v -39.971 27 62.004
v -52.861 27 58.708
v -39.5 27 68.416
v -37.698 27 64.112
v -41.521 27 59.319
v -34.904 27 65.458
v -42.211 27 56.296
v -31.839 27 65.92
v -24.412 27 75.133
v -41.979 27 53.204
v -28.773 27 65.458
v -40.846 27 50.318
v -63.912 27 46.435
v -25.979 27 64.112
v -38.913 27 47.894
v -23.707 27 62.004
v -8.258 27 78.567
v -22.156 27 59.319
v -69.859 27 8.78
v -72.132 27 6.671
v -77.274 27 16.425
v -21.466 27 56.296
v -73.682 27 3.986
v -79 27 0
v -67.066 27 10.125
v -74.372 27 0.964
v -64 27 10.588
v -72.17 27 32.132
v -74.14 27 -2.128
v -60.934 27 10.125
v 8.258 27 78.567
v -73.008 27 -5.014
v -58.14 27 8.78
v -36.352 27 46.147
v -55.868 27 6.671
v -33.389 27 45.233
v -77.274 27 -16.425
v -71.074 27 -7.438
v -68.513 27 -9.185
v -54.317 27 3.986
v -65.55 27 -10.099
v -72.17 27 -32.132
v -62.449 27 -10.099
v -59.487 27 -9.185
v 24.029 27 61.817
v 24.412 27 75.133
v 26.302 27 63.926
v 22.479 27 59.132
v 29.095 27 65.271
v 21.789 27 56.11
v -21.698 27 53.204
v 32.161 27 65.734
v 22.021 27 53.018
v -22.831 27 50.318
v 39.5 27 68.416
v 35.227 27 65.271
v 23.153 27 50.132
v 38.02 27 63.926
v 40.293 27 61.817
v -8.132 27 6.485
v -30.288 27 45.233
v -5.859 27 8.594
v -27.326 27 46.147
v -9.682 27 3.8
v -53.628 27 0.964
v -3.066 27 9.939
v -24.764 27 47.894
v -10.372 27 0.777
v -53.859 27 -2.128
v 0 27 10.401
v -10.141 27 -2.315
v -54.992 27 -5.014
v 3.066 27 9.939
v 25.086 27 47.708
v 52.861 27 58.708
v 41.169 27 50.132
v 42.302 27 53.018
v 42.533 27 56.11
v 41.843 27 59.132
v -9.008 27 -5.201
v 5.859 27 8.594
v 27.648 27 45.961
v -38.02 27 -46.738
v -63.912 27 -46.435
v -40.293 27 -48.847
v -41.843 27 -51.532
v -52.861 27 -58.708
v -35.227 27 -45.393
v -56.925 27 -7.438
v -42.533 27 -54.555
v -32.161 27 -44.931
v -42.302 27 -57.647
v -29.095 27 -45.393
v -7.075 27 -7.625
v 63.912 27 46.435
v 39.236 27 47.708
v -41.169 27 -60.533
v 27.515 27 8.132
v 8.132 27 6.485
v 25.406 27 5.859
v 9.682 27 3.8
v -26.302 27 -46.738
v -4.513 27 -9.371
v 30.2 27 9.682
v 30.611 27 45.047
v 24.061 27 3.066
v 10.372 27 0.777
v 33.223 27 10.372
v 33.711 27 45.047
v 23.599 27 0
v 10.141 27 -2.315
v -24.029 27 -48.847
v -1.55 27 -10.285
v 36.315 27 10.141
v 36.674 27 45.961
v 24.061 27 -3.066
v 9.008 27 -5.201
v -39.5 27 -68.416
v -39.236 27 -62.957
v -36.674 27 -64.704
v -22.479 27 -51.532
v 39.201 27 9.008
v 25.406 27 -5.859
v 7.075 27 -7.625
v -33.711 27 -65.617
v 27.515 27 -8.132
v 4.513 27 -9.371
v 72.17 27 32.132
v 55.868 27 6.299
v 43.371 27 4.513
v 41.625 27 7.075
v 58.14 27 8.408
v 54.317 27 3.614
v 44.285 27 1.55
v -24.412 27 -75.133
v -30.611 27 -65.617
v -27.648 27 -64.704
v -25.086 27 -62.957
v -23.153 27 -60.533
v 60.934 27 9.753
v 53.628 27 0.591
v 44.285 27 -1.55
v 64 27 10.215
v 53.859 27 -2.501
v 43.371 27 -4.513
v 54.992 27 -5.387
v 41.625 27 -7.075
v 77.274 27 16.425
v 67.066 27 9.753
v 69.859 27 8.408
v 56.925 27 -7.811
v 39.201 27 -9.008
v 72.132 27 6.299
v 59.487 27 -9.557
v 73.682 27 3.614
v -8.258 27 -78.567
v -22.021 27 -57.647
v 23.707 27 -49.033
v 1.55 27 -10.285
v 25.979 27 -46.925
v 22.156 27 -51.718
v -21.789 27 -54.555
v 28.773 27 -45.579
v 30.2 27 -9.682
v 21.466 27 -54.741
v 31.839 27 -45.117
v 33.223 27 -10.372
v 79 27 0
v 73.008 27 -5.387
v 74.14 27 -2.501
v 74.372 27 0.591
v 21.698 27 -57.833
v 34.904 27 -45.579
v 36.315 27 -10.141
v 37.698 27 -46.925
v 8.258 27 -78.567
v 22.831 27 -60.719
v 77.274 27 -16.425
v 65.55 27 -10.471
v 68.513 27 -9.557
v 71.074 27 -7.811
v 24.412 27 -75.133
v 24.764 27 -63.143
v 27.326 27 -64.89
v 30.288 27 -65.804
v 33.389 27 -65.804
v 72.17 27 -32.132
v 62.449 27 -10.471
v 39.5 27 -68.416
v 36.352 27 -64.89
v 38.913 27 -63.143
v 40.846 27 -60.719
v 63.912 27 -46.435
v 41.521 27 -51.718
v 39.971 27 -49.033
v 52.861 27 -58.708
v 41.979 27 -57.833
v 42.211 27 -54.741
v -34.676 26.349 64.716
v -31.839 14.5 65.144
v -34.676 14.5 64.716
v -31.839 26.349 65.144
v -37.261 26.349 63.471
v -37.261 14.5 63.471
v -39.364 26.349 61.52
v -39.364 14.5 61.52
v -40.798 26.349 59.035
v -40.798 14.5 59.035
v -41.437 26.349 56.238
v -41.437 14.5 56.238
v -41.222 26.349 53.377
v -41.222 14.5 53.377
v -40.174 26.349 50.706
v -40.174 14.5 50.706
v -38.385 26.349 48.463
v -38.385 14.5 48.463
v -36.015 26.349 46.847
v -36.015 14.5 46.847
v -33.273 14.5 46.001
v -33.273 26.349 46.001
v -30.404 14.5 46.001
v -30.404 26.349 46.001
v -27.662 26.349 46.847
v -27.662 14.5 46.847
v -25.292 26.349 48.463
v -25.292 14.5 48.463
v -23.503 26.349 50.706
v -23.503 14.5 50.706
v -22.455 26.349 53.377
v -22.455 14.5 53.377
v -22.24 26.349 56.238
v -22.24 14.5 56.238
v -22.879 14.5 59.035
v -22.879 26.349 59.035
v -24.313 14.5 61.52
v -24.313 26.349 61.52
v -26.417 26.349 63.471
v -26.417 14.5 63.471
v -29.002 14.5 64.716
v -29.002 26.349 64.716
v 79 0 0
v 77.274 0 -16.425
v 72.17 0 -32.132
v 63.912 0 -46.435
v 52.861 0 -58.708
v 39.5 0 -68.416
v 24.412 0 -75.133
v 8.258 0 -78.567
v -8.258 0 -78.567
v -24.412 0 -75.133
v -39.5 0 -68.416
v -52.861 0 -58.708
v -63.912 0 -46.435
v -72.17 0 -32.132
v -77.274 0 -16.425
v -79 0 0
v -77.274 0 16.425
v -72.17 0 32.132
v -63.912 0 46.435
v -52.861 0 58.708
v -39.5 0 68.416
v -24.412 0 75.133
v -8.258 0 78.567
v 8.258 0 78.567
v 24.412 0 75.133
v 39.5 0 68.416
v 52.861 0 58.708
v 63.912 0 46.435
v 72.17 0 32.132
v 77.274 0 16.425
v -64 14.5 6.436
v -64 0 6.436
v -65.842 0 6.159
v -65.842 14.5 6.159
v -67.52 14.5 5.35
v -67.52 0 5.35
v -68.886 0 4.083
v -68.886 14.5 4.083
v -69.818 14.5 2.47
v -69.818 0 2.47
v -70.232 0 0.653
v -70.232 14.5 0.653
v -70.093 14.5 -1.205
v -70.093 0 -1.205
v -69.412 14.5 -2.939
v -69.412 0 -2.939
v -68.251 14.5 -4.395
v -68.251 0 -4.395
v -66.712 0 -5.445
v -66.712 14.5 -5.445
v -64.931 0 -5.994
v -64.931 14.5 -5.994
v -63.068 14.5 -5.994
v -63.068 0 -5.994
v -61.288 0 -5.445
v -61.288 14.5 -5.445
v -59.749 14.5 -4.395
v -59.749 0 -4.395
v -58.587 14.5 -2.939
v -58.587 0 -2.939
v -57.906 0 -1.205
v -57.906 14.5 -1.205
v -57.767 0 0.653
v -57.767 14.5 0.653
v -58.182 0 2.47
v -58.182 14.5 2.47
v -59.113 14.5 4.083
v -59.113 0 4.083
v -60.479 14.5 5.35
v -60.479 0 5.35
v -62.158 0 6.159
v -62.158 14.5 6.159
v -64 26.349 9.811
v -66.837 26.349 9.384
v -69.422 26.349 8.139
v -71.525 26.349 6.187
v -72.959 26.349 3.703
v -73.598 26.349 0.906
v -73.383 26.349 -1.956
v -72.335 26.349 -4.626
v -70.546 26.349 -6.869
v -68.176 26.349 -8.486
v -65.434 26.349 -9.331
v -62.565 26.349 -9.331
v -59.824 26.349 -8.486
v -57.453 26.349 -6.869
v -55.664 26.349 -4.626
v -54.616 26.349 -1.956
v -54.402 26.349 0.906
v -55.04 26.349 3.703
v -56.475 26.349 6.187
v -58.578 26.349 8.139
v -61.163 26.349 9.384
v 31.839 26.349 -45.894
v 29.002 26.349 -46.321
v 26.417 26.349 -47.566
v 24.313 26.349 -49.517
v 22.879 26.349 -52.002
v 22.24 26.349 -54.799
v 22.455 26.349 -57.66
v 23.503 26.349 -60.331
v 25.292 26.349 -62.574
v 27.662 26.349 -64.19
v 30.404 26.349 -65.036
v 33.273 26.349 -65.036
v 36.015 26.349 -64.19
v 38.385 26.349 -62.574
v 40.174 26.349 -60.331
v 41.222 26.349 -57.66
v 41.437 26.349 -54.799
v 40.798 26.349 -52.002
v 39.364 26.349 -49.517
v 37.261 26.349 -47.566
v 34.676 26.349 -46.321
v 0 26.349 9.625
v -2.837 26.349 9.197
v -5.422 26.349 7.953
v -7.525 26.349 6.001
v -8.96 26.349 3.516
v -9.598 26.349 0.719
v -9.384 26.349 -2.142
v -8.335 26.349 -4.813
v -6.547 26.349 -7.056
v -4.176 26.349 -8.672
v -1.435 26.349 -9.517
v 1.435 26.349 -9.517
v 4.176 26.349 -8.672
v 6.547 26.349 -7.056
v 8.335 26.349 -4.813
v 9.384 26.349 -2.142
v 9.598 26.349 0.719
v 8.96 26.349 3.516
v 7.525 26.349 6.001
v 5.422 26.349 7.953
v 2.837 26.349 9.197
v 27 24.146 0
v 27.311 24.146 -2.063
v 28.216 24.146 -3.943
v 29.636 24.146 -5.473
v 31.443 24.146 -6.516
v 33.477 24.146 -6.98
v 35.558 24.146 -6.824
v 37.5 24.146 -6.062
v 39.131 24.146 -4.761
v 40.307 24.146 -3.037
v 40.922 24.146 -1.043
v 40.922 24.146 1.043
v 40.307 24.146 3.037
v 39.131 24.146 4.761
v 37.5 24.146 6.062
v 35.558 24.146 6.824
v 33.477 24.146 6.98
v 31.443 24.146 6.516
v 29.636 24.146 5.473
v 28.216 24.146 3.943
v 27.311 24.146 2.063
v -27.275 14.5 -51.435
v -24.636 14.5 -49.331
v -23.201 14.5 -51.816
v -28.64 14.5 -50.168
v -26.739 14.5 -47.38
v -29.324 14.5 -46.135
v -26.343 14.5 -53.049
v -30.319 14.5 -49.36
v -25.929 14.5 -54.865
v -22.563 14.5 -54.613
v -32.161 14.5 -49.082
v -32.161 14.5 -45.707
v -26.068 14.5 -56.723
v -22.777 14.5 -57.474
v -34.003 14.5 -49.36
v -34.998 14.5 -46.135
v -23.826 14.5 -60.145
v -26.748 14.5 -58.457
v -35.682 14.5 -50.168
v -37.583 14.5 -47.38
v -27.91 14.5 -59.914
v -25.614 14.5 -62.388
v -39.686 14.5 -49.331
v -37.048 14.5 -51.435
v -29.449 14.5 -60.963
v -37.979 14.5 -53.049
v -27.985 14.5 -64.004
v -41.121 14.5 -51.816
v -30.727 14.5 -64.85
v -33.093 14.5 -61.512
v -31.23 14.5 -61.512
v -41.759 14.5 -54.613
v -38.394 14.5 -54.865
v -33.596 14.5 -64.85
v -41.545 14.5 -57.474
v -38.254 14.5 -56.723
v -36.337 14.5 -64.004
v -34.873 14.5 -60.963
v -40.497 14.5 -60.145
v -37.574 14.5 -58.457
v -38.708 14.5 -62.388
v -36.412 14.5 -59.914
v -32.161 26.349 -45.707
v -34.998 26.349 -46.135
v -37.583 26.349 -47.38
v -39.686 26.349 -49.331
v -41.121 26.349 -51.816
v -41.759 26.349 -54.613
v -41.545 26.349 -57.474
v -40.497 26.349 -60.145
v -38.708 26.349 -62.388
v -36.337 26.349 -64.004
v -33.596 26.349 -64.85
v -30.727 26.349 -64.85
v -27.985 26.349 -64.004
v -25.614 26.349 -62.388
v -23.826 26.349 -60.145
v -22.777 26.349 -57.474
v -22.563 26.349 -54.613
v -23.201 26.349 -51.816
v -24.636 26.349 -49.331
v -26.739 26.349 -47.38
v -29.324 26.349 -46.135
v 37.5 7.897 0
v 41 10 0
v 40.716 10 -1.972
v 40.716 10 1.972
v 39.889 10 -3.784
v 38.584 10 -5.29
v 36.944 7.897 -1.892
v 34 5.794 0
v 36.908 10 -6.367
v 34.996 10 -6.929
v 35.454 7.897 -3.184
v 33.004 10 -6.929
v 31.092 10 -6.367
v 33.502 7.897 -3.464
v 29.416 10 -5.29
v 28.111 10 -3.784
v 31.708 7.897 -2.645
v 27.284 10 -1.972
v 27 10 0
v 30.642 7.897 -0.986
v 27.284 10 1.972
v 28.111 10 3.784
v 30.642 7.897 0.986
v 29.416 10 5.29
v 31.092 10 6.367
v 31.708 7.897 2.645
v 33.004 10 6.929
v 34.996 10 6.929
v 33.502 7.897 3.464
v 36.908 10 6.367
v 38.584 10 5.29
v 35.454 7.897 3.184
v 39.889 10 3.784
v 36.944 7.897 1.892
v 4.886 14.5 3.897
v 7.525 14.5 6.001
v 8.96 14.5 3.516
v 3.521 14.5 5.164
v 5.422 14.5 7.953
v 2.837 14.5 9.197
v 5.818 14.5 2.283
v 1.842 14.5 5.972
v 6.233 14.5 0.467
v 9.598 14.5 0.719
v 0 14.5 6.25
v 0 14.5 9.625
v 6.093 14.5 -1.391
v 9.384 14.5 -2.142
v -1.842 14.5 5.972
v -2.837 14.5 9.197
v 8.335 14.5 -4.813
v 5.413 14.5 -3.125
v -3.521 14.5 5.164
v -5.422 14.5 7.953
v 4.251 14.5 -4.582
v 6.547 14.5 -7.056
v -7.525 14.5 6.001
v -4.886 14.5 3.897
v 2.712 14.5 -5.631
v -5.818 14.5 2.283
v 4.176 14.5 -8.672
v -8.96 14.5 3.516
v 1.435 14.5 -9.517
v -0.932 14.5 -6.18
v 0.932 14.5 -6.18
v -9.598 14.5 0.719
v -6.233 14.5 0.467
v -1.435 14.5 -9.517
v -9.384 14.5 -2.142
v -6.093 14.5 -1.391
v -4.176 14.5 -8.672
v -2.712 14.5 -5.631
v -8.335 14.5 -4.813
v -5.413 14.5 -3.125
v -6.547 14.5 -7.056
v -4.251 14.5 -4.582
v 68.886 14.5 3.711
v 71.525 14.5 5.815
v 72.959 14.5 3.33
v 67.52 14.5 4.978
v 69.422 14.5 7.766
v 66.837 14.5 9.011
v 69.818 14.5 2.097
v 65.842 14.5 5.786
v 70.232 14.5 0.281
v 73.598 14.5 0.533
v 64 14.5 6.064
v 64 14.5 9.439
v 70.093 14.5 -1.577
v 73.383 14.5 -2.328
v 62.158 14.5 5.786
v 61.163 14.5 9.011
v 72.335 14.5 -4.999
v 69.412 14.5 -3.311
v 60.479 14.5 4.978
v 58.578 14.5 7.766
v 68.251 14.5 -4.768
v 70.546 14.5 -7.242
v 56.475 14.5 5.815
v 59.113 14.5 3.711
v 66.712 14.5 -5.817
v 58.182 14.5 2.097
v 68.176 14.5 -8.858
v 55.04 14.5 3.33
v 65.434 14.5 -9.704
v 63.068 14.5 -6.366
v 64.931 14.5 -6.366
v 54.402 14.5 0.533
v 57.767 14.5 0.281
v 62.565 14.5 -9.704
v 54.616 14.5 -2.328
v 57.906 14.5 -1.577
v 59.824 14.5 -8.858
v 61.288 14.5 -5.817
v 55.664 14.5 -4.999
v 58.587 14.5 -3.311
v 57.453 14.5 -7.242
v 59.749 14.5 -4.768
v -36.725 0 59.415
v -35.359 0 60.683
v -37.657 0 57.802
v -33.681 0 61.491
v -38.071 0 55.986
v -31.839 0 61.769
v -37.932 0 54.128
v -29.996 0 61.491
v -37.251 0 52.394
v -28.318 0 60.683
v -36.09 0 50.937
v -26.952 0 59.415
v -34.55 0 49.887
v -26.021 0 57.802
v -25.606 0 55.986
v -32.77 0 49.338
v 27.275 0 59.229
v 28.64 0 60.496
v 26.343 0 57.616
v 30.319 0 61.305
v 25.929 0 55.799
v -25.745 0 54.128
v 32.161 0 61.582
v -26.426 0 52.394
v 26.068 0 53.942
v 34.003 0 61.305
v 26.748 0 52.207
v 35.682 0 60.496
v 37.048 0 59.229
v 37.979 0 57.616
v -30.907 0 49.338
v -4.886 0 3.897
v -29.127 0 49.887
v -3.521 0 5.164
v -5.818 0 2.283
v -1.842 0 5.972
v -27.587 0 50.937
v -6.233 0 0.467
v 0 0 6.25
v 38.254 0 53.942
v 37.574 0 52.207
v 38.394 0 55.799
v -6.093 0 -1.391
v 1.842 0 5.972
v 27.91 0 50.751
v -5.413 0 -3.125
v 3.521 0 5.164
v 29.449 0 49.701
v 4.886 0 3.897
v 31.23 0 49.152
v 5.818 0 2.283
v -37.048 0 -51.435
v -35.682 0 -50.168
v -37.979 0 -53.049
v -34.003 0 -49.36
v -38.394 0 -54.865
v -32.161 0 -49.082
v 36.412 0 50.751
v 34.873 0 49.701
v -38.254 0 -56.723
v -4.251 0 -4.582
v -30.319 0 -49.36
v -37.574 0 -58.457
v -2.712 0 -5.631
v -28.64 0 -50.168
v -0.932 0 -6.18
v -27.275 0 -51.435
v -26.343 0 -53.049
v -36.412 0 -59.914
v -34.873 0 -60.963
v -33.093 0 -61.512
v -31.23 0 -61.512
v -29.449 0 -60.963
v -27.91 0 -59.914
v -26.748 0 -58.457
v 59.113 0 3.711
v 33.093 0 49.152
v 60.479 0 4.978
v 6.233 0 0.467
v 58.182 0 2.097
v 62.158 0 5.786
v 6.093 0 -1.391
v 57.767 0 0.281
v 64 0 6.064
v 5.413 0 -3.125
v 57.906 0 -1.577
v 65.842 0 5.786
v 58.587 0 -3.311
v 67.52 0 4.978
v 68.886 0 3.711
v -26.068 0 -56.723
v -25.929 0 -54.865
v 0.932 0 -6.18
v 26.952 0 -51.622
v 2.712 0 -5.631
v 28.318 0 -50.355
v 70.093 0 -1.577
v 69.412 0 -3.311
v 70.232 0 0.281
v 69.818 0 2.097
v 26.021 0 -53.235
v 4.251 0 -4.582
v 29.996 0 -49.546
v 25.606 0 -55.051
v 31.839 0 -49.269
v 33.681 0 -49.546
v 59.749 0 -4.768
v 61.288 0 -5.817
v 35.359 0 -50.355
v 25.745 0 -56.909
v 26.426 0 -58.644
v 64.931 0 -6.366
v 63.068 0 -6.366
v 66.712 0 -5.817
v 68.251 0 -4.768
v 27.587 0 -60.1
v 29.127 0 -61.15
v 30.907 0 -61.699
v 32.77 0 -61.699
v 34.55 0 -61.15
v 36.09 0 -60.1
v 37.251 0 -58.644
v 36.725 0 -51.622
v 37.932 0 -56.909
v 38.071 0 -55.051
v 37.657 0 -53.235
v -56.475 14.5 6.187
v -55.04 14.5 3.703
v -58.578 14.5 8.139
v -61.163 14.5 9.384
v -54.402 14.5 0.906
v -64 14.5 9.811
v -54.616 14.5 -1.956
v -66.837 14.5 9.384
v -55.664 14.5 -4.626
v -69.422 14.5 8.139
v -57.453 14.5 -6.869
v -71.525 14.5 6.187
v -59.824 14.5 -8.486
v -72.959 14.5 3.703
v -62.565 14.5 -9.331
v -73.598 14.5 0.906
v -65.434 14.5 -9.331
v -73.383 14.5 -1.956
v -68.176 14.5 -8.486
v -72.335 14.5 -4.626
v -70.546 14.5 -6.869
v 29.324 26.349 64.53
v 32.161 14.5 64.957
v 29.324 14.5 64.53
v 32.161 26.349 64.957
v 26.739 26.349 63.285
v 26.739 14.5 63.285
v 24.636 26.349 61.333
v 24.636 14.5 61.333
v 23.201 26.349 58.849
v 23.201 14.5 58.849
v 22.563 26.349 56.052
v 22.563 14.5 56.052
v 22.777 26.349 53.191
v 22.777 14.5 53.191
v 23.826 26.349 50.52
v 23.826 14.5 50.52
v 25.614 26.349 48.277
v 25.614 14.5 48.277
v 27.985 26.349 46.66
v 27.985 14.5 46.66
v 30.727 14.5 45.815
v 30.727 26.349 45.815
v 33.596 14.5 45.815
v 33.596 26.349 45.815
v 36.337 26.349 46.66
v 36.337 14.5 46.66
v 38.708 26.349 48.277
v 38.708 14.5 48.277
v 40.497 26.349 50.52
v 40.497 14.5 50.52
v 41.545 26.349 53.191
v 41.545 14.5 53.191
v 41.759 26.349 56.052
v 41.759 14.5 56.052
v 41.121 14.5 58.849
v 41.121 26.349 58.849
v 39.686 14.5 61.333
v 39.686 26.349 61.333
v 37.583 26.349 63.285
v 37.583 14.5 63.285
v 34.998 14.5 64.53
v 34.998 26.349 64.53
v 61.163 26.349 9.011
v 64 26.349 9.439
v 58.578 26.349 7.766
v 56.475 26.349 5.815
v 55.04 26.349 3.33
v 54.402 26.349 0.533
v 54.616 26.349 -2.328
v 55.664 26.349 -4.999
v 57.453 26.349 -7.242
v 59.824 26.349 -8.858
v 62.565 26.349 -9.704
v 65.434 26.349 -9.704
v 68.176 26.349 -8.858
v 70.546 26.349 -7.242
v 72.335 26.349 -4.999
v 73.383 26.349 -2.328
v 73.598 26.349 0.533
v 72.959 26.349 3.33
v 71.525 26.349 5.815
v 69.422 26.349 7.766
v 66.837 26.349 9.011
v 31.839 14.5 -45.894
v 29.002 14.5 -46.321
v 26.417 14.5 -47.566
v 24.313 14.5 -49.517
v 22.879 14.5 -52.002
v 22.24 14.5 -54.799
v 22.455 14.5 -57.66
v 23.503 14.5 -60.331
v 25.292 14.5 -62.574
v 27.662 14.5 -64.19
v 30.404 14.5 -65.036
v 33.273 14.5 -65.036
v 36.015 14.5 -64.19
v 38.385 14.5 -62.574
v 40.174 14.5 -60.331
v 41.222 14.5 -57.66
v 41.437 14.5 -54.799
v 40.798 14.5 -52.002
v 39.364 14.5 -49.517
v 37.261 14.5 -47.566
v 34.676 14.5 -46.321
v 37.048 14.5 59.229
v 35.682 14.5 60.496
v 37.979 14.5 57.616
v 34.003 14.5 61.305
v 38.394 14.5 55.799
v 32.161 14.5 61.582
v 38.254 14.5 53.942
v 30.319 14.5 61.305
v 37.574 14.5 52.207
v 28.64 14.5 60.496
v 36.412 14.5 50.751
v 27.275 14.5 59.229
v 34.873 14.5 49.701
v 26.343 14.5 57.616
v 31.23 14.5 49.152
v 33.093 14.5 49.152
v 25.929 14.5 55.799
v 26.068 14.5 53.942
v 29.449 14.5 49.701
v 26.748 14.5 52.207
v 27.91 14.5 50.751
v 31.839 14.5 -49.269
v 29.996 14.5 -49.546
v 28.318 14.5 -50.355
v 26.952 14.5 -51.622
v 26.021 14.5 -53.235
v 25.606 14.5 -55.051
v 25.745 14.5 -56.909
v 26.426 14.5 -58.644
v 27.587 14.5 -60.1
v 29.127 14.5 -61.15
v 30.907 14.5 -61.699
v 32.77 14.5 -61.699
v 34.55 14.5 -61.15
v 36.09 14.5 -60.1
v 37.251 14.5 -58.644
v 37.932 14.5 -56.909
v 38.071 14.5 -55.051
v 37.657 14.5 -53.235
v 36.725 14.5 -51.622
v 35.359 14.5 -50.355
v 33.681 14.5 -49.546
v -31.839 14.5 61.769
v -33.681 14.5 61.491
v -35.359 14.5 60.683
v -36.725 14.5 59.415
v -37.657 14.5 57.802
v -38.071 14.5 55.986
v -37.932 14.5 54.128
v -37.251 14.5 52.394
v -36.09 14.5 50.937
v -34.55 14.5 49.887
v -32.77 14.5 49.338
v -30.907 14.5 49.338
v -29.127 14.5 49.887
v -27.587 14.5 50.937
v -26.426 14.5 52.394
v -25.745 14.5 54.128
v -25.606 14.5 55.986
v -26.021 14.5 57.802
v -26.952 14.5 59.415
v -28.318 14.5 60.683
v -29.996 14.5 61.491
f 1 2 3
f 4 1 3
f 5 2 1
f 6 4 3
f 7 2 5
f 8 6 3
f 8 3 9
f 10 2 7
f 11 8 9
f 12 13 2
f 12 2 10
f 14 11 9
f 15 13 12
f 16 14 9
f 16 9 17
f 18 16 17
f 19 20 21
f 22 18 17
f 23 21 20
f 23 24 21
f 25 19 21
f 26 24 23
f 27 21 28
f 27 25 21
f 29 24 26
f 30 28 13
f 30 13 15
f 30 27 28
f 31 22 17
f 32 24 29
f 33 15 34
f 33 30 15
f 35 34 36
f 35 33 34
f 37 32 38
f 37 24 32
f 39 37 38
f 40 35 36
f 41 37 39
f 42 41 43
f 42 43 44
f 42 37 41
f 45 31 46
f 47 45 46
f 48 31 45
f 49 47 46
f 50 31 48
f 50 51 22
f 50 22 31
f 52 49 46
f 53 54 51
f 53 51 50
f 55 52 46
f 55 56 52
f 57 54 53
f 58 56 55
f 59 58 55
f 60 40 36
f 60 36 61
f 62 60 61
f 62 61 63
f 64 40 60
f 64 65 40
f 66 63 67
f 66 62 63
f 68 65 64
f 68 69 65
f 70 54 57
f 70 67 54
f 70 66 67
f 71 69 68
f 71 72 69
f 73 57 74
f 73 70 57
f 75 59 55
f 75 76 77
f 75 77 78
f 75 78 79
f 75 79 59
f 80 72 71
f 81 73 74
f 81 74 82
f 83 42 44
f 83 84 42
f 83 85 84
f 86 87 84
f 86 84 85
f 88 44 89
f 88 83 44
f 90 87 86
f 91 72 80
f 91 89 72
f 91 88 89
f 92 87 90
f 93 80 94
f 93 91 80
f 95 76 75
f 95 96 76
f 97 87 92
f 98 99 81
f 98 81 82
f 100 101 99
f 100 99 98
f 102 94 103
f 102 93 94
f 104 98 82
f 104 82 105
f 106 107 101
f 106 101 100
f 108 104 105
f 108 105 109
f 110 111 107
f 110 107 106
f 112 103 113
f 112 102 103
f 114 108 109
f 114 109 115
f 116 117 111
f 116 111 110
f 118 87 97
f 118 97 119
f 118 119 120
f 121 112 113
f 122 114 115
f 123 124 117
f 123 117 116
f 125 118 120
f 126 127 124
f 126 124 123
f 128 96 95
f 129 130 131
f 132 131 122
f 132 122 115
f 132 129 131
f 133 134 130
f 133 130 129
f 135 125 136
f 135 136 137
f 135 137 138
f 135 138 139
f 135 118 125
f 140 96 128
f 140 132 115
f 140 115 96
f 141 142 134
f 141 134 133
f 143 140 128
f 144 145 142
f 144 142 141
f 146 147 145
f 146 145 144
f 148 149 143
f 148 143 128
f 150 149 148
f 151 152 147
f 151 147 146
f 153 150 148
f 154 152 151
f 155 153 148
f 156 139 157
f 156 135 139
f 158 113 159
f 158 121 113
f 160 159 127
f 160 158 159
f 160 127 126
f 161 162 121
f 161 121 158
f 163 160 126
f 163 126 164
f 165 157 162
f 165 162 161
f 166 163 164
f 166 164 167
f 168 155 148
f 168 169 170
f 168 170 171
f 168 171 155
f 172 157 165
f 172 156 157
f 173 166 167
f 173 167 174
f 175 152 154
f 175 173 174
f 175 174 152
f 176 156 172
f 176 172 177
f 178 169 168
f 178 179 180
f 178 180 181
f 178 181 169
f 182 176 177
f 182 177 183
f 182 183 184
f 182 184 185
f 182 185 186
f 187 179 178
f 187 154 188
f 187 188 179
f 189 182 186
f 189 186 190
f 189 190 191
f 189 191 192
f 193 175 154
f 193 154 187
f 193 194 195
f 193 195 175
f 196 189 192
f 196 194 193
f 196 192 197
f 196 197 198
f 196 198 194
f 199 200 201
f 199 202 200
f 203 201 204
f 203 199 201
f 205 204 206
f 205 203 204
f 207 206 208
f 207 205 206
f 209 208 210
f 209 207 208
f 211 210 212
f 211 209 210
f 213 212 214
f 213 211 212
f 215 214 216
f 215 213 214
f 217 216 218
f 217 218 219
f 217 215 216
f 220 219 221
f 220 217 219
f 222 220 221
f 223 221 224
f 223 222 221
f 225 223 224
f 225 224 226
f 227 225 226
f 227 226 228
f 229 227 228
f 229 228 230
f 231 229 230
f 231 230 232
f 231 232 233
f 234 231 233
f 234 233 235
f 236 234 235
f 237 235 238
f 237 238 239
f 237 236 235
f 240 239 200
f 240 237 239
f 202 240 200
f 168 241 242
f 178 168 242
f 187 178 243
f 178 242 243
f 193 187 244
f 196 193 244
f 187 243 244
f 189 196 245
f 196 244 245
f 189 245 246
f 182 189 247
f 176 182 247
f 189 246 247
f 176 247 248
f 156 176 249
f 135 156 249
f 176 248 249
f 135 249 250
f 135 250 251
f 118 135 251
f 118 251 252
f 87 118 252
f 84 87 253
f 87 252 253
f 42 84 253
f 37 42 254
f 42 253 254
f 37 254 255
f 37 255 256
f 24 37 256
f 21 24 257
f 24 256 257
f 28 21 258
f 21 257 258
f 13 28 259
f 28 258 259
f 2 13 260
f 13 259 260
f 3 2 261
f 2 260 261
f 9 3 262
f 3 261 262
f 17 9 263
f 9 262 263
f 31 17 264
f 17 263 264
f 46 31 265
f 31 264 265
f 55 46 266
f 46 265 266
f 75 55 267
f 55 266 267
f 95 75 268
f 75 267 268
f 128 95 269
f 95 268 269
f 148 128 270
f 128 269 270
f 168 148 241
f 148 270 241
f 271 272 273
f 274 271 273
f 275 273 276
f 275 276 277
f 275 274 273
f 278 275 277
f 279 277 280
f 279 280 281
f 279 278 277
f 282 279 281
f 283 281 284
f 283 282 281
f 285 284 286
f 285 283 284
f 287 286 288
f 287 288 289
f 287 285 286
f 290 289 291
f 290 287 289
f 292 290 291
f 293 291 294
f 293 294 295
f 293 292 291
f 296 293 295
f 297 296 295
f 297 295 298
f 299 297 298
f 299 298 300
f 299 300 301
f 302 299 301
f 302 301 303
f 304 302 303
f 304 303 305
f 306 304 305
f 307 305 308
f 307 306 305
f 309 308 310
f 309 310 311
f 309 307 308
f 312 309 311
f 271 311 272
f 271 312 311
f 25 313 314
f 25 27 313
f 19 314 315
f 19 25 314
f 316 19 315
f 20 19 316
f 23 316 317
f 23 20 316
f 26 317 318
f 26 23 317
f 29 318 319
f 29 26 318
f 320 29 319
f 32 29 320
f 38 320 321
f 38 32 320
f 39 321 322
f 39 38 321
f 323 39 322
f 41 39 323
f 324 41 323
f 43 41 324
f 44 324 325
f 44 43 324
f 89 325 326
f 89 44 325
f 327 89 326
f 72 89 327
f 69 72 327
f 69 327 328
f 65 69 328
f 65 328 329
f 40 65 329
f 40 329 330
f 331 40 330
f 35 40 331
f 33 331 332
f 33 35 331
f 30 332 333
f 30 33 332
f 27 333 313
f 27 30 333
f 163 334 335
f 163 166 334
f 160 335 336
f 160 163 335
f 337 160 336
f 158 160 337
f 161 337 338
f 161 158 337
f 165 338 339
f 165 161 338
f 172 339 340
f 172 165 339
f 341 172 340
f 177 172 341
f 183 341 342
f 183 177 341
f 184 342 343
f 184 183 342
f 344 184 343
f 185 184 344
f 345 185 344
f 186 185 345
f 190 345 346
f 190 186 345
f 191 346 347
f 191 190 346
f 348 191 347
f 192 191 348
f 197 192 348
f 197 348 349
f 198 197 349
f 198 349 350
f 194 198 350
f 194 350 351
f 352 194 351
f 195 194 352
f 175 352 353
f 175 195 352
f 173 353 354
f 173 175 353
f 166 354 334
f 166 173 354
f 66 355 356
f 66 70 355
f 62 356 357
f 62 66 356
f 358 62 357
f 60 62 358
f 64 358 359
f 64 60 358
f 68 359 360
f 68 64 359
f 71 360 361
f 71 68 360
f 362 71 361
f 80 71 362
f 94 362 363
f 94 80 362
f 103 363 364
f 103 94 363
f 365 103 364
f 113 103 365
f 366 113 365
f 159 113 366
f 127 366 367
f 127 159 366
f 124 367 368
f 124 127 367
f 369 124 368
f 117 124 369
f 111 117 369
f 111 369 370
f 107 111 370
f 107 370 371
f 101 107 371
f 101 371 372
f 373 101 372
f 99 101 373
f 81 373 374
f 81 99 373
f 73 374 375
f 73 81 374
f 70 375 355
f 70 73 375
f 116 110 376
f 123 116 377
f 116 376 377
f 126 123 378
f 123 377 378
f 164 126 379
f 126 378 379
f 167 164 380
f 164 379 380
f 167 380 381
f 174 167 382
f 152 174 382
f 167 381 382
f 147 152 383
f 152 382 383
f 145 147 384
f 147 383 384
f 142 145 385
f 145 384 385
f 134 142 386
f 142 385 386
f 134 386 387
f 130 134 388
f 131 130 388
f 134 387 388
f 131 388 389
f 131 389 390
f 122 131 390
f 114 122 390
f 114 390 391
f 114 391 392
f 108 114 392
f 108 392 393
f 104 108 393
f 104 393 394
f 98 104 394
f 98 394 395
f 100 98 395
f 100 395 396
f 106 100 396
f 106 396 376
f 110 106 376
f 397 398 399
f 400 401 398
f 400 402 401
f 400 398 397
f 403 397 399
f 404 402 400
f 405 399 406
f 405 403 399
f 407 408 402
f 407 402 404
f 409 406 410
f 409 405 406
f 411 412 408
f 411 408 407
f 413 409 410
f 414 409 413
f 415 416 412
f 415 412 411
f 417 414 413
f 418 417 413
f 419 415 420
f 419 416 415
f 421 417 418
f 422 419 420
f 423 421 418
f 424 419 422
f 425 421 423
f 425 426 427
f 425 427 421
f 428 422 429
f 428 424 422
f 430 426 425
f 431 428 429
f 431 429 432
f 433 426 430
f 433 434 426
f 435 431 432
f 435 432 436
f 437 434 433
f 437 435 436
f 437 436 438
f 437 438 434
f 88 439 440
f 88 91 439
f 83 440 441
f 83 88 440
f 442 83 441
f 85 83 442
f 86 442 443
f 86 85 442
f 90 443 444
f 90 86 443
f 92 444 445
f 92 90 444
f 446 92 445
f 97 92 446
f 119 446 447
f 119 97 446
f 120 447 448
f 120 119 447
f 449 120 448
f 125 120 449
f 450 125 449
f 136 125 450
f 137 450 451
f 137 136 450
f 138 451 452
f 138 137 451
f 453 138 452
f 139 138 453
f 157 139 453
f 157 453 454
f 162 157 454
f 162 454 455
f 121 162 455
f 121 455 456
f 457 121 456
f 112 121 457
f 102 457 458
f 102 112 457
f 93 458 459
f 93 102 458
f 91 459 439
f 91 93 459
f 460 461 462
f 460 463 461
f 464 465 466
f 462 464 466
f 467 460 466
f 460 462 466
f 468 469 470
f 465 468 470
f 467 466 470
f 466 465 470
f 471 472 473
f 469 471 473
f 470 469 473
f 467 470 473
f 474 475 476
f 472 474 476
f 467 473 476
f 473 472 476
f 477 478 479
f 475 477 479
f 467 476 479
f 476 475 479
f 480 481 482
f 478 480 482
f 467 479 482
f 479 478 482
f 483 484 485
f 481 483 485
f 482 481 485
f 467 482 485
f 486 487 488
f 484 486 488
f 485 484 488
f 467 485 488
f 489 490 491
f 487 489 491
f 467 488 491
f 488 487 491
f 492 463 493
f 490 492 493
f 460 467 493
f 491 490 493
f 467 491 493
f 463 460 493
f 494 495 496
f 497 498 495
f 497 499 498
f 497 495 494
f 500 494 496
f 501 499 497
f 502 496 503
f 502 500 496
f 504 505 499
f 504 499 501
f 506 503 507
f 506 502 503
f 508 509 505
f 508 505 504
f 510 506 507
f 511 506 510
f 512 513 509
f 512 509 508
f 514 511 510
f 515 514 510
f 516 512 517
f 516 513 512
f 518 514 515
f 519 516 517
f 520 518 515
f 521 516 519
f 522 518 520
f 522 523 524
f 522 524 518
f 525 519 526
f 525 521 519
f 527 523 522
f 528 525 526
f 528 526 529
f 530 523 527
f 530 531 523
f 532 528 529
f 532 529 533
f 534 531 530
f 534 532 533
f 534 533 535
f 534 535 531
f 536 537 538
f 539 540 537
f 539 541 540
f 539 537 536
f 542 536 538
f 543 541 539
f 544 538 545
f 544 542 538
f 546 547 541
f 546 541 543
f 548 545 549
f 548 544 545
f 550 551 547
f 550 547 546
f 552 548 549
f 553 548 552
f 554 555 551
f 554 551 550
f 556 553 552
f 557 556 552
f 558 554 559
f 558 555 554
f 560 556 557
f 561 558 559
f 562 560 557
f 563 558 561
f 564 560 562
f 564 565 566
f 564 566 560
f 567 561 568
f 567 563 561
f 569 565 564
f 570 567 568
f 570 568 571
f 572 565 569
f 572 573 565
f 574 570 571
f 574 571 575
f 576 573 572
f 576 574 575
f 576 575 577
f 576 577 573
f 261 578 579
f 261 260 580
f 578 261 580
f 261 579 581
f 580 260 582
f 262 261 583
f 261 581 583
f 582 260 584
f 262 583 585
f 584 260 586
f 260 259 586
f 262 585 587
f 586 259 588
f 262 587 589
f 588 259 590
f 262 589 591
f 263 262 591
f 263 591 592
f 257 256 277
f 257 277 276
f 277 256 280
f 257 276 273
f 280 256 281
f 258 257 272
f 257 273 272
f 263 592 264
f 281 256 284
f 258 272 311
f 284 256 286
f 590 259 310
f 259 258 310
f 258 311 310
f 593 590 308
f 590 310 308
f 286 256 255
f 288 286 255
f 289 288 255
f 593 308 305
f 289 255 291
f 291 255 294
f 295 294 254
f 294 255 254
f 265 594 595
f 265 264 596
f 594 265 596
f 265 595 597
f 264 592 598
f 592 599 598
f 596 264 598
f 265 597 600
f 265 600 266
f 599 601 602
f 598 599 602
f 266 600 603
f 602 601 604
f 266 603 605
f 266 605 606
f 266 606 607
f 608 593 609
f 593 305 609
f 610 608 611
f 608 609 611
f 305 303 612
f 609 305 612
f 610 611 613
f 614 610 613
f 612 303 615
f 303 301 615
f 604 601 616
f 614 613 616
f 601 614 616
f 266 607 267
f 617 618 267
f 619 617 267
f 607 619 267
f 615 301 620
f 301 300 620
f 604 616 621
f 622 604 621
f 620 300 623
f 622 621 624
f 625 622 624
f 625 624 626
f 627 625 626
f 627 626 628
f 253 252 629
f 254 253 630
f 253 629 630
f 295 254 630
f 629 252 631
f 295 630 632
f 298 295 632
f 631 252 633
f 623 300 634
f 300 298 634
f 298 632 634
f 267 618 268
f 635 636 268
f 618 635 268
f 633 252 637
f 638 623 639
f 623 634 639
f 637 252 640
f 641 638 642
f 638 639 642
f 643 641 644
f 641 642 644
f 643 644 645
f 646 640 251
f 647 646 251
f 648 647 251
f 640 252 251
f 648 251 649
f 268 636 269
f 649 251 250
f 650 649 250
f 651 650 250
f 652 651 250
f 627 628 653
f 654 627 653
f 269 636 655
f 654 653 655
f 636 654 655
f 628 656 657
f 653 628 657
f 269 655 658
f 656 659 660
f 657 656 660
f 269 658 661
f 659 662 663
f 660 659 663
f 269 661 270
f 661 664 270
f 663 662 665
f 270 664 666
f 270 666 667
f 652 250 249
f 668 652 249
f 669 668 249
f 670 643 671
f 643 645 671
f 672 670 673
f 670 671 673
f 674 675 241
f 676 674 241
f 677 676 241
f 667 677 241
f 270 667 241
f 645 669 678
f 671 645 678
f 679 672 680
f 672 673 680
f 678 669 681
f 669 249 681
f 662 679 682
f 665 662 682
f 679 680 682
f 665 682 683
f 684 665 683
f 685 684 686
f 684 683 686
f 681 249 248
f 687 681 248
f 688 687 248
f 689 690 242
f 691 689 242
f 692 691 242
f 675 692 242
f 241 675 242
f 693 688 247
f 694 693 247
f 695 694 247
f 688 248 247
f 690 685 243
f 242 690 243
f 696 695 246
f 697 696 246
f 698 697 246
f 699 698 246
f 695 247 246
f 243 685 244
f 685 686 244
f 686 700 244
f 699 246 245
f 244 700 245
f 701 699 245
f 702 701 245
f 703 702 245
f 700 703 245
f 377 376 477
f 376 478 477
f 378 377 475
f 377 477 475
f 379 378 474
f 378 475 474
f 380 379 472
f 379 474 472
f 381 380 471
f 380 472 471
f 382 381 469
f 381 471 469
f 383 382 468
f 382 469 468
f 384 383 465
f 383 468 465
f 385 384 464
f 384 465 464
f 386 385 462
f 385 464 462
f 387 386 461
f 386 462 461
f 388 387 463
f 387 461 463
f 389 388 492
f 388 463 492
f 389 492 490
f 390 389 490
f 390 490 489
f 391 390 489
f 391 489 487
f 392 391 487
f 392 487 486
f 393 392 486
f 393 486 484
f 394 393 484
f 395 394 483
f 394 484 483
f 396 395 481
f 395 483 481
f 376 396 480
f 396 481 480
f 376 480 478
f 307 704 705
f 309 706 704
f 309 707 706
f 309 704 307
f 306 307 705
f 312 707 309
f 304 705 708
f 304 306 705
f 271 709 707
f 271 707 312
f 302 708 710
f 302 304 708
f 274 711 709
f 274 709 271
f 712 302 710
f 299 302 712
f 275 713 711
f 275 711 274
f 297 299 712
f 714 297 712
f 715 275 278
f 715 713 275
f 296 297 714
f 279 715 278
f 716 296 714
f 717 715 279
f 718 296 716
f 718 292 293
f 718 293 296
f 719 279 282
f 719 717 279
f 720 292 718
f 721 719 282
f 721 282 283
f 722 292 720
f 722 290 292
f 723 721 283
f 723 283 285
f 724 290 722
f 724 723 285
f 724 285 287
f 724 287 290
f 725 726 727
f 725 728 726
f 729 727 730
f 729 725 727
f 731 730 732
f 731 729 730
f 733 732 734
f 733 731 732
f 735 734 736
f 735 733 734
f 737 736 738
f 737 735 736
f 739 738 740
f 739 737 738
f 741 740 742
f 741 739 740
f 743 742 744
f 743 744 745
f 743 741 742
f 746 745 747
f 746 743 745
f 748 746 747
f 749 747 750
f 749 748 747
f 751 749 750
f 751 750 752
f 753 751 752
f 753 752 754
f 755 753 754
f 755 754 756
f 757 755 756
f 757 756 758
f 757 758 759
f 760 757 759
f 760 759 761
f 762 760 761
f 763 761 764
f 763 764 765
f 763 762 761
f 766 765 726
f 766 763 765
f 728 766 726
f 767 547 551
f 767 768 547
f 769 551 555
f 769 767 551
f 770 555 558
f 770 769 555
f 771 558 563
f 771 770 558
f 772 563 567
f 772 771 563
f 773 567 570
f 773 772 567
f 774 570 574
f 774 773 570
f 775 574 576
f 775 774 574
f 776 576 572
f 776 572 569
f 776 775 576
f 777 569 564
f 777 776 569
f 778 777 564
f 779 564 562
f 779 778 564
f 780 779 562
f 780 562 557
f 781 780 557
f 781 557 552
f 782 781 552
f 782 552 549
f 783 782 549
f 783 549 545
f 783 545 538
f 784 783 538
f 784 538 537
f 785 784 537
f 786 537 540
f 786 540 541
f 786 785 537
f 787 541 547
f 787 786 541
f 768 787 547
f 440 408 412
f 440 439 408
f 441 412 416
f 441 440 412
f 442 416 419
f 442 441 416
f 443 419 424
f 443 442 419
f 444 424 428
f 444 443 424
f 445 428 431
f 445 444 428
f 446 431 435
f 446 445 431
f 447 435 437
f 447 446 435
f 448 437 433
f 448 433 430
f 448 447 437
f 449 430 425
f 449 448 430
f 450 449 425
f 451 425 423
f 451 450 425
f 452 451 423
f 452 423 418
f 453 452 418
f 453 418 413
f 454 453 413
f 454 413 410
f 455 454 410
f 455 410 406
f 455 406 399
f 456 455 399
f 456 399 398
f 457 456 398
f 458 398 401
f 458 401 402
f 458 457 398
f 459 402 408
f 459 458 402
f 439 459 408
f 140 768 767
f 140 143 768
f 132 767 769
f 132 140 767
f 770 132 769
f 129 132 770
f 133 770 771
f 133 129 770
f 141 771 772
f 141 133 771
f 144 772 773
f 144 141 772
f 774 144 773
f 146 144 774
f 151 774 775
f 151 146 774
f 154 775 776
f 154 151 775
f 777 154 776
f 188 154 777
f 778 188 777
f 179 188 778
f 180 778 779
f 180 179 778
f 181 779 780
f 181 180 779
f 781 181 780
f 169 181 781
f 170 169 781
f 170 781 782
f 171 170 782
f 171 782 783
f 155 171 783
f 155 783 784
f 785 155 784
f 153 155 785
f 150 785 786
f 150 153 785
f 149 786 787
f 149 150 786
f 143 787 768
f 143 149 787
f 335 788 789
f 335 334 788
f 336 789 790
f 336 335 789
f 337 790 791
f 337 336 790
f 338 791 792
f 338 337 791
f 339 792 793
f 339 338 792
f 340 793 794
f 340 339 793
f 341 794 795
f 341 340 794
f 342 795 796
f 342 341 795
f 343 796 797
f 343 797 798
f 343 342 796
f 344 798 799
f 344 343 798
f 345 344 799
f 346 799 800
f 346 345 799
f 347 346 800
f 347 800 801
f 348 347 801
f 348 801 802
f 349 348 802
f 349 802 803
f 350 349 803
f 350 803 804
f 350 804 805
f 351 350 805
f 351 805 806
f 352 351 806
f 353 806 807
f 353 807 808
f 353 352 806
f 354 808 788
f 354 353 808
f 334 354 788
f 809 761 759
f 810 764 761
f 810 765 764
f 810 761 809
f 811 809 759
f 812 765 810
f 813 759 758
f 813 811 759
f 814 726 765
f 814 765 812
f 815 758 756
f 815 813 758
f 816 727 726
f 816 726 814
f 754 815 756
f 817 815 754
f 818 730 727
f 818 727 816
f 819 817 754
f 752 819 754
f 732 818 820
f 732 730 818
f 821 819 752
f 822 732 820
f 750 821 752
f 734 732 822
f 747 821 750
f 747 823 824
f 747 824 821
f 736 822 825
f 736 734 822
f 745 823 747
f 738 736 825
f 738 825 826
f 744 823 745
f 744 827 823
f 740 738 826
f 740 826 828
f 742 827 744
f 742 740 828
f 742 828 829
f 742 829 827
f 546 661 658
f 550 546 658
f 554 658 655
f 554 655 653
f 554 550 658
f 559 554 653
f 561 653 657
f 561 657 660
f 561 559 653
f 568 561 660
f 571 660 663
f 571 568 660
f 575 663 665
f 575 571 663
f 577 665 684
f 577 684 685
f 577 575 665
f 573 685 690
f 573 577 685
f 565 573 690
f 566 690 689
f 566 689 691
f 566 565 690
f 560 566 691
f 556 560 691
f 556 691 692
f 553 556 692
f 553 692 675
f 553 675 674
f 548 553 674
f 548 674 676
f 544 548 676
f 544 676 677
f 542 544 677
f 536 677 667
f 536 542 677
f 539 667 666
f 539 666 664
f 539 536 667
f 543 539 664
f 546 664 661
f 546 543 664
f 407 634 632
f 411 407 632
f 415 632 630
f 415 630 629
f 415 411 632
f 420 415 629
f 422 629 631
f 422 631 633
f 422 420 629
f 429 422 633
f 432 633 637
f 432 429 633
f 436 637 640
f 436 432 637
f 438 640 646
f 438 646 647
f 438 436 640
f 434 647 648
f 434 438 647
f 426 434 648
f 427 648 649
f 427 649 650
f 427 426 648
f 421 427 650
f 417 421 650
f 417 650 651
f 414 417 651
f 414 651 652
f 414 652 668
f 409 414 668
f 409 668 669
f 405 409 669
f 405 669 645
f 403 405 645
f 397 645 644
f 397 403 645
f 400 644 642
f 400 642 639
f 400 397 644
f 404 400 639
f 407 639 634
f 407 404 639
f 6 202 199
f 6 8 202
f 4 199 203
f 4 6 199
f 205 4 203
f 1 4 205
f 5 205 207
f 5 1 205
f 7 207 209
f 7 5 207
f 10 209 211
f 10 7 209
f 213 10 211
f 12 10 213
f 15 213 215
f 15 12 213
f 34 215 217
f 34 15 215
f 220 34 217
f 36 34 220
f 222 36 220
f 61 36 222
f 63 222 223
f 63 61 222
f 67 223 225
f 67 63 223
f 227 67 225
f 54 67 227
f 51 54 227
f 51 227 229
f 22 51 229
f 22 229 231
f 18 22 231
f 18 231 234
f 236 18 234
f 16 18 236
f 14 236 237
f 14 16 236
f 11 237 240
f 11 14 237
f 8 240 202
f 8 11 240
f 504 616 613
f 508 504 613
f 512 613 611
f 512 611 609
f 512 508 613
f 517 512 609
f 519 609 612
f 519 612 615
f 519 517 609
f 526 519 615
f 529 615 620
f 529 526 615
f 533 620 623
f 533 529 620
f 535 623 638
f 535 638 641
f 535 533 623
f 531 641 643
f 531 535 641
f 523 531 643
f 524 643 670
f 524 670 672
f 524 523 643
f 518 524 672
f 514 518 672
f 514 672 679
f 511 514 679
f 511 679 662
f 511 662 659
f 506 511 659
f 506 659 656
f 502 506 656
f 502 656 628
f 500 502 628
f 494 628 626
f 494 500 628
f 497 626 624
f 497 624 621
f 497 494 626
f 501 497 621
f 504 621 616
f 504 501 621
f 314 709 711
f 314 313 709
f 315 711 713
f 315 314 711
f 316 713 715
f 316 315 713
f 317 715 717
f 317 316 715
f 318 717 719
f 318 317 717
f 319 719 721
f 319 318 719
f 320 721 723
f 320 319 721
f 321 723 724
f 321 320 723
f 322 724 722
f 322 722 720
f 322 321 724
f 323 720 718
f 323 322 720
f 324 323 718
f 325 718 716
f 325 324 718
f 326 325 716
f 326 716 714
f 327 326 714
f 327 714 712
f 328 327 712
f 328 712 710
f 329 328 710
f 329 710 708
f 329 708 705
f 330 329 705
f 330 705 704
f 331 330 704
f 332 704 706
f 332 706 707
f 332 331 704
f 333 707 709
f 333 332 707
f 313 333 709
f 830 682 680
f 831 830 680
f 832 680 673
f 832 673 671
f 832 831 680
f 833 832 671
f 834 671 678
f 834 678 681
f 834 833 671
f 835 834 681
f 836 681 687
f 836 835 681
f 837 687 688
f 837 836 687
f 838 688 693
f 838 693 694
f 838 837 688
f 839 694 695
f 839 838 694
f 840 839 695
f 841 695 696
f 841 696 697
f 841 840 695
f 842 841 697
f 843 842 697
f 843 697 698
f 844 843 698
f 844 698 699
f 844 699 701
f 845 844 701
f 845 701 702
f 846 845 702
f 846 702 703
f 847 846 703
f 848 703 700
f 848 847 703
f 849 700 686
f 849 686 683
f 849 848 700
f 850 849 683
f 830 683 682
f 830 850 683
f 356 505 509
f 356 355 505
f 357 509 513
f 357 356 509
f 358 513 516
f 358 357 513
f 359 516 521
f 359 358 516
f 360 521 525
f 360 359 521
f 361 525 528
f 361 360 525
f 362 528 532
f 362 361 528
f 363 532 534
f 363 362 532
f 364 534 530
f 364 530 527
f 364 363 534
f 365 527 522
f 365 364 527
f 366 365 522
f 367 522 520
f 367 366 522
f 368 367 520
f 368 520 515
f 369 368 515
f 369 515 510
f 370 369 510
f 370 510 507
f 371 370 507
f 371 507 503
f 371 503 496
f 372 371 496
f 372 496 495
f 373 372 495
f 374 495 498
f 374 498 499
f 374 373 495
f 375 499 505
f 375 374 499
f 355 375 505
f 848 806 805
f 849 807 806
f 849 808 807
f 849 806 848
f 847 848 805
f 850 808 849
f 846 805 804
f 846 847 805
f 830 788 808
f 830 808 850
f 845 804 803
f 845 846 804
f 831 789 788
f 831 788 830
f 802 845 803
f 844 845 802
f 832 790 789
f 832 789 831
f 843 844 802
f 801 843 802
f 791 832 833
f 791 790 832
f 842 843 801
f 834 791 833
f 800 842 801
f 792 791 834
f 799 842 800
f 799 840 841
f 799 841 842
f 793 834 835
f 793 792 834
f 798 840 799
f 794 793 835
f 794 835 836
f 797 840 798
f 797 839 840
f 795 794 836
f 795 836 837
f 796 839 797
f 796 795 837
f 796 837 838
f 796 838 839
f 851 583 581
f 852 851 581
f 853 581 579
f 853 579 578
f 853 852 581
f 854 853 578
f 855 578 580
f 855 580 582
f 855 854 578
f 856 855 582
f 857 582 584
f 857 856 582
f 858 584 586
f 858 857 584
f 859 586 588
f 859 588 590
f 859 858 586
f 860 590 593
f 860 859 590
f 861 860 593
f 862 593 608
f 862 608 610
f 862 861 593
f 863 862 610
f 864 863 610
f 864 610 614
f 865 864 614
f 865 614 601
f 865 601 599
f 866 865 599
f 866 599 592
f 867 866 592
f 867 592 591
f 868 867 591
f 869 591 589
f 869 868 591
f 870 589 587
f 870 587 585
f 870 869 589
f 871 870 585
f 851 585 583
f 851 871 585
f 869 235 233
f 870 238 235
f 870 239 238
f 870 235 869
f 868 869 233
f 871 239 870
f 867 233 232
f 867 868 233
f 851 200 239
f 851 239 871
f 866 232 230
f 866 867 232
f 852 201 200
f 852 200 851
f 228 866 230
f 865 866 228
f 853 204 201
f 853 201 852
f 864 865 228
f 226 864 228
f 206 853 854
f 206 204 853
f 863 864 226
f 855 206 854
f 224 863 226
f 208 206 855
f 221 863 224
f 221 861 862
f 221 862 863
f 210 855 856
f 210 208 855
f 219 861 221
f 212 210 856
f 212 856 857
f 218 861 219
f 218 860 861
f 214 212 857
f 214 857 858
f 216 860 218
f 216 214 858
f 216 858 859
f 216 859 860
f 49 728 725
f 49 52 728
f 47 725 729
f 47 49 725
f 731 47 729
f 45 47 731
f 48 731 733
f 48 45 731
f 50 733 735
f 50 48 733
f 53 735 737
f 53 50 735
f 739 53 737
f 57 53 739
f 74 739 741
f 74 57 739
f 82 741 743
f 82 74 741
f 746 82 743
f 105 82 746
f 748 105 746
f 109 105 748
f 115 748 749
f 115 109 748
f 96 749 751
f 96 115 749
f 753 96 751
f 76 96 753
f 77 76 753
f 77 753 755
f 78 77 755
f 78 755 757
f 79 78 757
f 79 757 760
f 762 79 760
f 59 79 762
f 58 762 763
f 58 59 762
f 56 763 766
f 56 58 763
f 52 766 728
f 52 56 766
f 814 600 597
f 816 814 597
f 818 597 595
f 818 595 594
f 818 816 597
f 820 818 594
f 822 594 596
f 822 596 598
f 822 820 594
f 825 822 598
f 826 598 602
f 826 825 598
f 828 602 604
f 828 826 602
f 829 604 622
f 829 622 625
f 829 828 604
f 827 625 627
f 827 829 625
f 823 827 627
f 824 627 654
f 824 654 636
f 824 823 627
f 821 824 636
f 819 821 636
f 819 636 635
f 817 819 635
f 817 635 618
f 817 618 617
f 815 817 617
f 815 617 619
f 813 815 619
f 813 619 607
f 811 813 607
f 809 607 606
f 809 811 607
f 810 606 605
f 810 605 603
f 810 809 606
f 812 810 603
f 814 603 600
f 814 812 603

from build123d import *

# Parameters (mm, degrees)
SKETCH1_R                                   = 79
SKETCH1_R_2                                 = 6
BOSS_EXTRUDE1_DEPTH                         = 27
CBORE_FOR_0_BINDING_HEAD_MACHINE_SC_2_COUNT = 2
CBORE_FOR_0_BINDING_HEAD_MACHINE_SC_2_PITCH = 64
CBORE_FOR_0_BINDING_HEAD_MACHINE_SC_3_COUNT = 2
CBORE_FOR_0_BINDING_HEAD_MACHINE_SC_3_PITCH = 110.851251684
CBORE_FOR_0_BINDING_HEAD_MACHINE_SC_4_COUNT = 2
CBORE_FOR_0_BINDING_HEAD_MACHINE_SC_4_PITCH = 128
CBORE_FOR_0_BINDING_HEAD_MACHINE_SC_5_COUNT = 2
CBORE_FOR_0_BINDING_HEAD_MACHINE_SC_5_PITCH = 110.851251684
CBORE_FOR_0_BINDING_HEAD_MACHINE_SC_6_COUNT = 2
CBORE_FOR_0_BINDING_HEAD_MACHINE_SC_6_PITCH = 64
CBORE_FOR_0_BINDING_HEAD_MACHINE_SC_7_COUNT = 2
CBORE_FOR_0_BINDING_HEAD_MACHINE_SC_7_PITCH = 64
F_97_0_0059_DIAMETER_HOLE1_D                = 13.99999994
F_97_0_0059_DIAMETER_HOLE1_DEPTH            = 17
F_97_0_0059_DIAMETER_HOLE1_CSINK_D          = 20.8026
F_97_0_0059_DIAMETER_HOLE1_CSINK_ANGLE      = 100
F_97_0_0059_DIAMETER_HOLE1_TIP              = 4.206024315


with BuildPart() as part:
    # Sketch1 → Boss-Extrude1 (new body)
    with BuildSketch(Plane(origin=(0, 0, 0), x_dir=(1, 0, 0), z_dir=(0, 1, 0))):
        Circle(SKETCH1_R)
        Circle(SKETCH1_R_2, mode=Mode.SUBTRACT)
    extrude(amount=BOSS_EXTRUDE1_DEPTH)

    # Sketch5 → CBORE for #0 Binding Head Machine Screw1 (revolve, cut)
    with BuildSketch(Plane(origin=(31.838574382, 27, -55.51851206), x_dir=(0, 0, 1), z_dir=(1, 0, 0))):
        Polygon((0, 0), (0, 27), (6.249999946, 27), (6.249999946, 12.499999892), (9.625000054, 12.499999892), (9.625000054, 0.651392998), (10.4013, 0), align=None)
    cbore_for_0_binding_head_machine_screw1 = revolve(axis=Axis((31.838574382, 33.35, -55.51851206), (0, -1, 0)), mode=Mode.SUBTRACT)

    # CBORE for _0 Binding Head Machine Sc 2: CBORE for #0 Binding Head Machine Screw1 ×2
    with Locations(*[Vector(0.502518041, 0, 0.864566723) * (i * CBORE_FOR_0_BINDING_HEAD_MACHINE_SC_2_PITCH) for i in range(1, CBORE_FOR_0_BINDING_HEAD_MACHINE_SC_2_COUNT)]):
        add(cbore_for_0_binding_head_machine_screw1, mode=Mode.SUBTRACT)

    # CBORE for _0 Binding Head Machine Sc 3: CBORE for #0 Binding Head Machine Screw1 ×2
    with Locations(*[Vector(0.002910028, 0, 0.999995766) * (i * CBORE_FOR_0_BINDING_HEAD_MACHINE_SC_3_PITCH) for i in range(1, CBORE_FOR_0_BINDING_HEAD_MACHINE_SC_3_COUNT)]):
        add(cbore_for_0_binding_head_machine_screw1, mode=Mode.SUBTRACT)

    # CBORE for _0 Binding Head Machine Sc 4: CBORE for #0 Binding Head Machine Screw1 ×2
    with Locations(*[Vector(-0.497477725, 0, 0.867476751) * (i * CBORE_FOR_0_BINDING_HEAD_MACHINE_SC_4_PITCH) for i in range(1, CBORE_FOR_0_BINDING_HEAD_MACHINE_SC_4_COUNT)]):
        add(cbore_for_0_binding_head_machine_screw1, mode=Mode.SUBTRACT)

    # CBORE for _0 Binding Head Machine Sc 5: CBORE for #0 Binding Head Machine Screw1 ×2
    with Locations(*[Vector(-0.864566723, 0, 0.502518041) * (i * CBORE_FOR_0_BINDING_HEAD_MACHINE_SC_5_PITCH) for i in range(1, CBORE_FOR_0_BINDING_HEAD_MACHINE_SC_5_COUNT)]):
        add(cbore_for_0_binding_head_machine_screw1, mode=Mode.SUBTRACT)

    # CBORE for _0 Binding Head Machine Sc 6: CBORE for #0 Binding Head Machine Screw1 ×2
    with Locations(*[Vector(-0.999995766, 0, 0.002910028) * (i * CBORE_FOR_0_BINDING_HEAD_MACHINE_SC_6_PITCH) for i in range(1, CBORE_FOR_0_BINDING_HEAD_MACHINE_SC_6_COUNT)]):
        add(cbore_for_0_binding_head_machine_screw1, mode=Mode.SUBTRACT)

    # CBORE for _0 Binding Head Machine Sc 7: CBORE for #0 Binding Head Machine Screw1 ×2
    with Locations(*[Vector(-0.497477725, 0, 0.867476751) * (i * CBORE_FOR_0_BINDING_HEAD_MACHINE_SC_7_PITCH) for i in range(1, CBORE_FOR_0_BINDING_HEAD_MACHINE_SC_7_COUNT)]):
        add(cbore_for_0_binding_head_machine_screw1, mode=Mode.SUBTRACT)

    # #97 (0.0059) Diameter Hole1
    with Locations(Plane(origin=(0, 27, 0), x_dir=(1, 0, 0), z_dir=(0, 1, 0))):
        with Locations((34, 0)):
            CounterSinkHole(F_97_0_0059_DIAMETER_HOLE1_D / 2, F_97_0_0059_DIAMETER_HOLE1_CSINK_D / 2, depth=F_97_0_0059_DIAMETER_HOLE1_DEPTH, counter_sink_angle=F_97_0_0059_DIAMETER_HOLE1_CSINK_ANGLE)
            with Locations((0, 0, -(F_97_0_0059_DIAMETER_HOLE1_DEPTH + F_97_0_0059_DIAMETER_HOLE1_TIP / 2))):  # 118° drill point
                Cone(0, F_97_0_0059_DIAMETER_HOLE1_D / 2, F_97_0_0059_DIAMETER_HOLE1_TIP, mode=Mode.SUBTRACT)


solid = part.part
